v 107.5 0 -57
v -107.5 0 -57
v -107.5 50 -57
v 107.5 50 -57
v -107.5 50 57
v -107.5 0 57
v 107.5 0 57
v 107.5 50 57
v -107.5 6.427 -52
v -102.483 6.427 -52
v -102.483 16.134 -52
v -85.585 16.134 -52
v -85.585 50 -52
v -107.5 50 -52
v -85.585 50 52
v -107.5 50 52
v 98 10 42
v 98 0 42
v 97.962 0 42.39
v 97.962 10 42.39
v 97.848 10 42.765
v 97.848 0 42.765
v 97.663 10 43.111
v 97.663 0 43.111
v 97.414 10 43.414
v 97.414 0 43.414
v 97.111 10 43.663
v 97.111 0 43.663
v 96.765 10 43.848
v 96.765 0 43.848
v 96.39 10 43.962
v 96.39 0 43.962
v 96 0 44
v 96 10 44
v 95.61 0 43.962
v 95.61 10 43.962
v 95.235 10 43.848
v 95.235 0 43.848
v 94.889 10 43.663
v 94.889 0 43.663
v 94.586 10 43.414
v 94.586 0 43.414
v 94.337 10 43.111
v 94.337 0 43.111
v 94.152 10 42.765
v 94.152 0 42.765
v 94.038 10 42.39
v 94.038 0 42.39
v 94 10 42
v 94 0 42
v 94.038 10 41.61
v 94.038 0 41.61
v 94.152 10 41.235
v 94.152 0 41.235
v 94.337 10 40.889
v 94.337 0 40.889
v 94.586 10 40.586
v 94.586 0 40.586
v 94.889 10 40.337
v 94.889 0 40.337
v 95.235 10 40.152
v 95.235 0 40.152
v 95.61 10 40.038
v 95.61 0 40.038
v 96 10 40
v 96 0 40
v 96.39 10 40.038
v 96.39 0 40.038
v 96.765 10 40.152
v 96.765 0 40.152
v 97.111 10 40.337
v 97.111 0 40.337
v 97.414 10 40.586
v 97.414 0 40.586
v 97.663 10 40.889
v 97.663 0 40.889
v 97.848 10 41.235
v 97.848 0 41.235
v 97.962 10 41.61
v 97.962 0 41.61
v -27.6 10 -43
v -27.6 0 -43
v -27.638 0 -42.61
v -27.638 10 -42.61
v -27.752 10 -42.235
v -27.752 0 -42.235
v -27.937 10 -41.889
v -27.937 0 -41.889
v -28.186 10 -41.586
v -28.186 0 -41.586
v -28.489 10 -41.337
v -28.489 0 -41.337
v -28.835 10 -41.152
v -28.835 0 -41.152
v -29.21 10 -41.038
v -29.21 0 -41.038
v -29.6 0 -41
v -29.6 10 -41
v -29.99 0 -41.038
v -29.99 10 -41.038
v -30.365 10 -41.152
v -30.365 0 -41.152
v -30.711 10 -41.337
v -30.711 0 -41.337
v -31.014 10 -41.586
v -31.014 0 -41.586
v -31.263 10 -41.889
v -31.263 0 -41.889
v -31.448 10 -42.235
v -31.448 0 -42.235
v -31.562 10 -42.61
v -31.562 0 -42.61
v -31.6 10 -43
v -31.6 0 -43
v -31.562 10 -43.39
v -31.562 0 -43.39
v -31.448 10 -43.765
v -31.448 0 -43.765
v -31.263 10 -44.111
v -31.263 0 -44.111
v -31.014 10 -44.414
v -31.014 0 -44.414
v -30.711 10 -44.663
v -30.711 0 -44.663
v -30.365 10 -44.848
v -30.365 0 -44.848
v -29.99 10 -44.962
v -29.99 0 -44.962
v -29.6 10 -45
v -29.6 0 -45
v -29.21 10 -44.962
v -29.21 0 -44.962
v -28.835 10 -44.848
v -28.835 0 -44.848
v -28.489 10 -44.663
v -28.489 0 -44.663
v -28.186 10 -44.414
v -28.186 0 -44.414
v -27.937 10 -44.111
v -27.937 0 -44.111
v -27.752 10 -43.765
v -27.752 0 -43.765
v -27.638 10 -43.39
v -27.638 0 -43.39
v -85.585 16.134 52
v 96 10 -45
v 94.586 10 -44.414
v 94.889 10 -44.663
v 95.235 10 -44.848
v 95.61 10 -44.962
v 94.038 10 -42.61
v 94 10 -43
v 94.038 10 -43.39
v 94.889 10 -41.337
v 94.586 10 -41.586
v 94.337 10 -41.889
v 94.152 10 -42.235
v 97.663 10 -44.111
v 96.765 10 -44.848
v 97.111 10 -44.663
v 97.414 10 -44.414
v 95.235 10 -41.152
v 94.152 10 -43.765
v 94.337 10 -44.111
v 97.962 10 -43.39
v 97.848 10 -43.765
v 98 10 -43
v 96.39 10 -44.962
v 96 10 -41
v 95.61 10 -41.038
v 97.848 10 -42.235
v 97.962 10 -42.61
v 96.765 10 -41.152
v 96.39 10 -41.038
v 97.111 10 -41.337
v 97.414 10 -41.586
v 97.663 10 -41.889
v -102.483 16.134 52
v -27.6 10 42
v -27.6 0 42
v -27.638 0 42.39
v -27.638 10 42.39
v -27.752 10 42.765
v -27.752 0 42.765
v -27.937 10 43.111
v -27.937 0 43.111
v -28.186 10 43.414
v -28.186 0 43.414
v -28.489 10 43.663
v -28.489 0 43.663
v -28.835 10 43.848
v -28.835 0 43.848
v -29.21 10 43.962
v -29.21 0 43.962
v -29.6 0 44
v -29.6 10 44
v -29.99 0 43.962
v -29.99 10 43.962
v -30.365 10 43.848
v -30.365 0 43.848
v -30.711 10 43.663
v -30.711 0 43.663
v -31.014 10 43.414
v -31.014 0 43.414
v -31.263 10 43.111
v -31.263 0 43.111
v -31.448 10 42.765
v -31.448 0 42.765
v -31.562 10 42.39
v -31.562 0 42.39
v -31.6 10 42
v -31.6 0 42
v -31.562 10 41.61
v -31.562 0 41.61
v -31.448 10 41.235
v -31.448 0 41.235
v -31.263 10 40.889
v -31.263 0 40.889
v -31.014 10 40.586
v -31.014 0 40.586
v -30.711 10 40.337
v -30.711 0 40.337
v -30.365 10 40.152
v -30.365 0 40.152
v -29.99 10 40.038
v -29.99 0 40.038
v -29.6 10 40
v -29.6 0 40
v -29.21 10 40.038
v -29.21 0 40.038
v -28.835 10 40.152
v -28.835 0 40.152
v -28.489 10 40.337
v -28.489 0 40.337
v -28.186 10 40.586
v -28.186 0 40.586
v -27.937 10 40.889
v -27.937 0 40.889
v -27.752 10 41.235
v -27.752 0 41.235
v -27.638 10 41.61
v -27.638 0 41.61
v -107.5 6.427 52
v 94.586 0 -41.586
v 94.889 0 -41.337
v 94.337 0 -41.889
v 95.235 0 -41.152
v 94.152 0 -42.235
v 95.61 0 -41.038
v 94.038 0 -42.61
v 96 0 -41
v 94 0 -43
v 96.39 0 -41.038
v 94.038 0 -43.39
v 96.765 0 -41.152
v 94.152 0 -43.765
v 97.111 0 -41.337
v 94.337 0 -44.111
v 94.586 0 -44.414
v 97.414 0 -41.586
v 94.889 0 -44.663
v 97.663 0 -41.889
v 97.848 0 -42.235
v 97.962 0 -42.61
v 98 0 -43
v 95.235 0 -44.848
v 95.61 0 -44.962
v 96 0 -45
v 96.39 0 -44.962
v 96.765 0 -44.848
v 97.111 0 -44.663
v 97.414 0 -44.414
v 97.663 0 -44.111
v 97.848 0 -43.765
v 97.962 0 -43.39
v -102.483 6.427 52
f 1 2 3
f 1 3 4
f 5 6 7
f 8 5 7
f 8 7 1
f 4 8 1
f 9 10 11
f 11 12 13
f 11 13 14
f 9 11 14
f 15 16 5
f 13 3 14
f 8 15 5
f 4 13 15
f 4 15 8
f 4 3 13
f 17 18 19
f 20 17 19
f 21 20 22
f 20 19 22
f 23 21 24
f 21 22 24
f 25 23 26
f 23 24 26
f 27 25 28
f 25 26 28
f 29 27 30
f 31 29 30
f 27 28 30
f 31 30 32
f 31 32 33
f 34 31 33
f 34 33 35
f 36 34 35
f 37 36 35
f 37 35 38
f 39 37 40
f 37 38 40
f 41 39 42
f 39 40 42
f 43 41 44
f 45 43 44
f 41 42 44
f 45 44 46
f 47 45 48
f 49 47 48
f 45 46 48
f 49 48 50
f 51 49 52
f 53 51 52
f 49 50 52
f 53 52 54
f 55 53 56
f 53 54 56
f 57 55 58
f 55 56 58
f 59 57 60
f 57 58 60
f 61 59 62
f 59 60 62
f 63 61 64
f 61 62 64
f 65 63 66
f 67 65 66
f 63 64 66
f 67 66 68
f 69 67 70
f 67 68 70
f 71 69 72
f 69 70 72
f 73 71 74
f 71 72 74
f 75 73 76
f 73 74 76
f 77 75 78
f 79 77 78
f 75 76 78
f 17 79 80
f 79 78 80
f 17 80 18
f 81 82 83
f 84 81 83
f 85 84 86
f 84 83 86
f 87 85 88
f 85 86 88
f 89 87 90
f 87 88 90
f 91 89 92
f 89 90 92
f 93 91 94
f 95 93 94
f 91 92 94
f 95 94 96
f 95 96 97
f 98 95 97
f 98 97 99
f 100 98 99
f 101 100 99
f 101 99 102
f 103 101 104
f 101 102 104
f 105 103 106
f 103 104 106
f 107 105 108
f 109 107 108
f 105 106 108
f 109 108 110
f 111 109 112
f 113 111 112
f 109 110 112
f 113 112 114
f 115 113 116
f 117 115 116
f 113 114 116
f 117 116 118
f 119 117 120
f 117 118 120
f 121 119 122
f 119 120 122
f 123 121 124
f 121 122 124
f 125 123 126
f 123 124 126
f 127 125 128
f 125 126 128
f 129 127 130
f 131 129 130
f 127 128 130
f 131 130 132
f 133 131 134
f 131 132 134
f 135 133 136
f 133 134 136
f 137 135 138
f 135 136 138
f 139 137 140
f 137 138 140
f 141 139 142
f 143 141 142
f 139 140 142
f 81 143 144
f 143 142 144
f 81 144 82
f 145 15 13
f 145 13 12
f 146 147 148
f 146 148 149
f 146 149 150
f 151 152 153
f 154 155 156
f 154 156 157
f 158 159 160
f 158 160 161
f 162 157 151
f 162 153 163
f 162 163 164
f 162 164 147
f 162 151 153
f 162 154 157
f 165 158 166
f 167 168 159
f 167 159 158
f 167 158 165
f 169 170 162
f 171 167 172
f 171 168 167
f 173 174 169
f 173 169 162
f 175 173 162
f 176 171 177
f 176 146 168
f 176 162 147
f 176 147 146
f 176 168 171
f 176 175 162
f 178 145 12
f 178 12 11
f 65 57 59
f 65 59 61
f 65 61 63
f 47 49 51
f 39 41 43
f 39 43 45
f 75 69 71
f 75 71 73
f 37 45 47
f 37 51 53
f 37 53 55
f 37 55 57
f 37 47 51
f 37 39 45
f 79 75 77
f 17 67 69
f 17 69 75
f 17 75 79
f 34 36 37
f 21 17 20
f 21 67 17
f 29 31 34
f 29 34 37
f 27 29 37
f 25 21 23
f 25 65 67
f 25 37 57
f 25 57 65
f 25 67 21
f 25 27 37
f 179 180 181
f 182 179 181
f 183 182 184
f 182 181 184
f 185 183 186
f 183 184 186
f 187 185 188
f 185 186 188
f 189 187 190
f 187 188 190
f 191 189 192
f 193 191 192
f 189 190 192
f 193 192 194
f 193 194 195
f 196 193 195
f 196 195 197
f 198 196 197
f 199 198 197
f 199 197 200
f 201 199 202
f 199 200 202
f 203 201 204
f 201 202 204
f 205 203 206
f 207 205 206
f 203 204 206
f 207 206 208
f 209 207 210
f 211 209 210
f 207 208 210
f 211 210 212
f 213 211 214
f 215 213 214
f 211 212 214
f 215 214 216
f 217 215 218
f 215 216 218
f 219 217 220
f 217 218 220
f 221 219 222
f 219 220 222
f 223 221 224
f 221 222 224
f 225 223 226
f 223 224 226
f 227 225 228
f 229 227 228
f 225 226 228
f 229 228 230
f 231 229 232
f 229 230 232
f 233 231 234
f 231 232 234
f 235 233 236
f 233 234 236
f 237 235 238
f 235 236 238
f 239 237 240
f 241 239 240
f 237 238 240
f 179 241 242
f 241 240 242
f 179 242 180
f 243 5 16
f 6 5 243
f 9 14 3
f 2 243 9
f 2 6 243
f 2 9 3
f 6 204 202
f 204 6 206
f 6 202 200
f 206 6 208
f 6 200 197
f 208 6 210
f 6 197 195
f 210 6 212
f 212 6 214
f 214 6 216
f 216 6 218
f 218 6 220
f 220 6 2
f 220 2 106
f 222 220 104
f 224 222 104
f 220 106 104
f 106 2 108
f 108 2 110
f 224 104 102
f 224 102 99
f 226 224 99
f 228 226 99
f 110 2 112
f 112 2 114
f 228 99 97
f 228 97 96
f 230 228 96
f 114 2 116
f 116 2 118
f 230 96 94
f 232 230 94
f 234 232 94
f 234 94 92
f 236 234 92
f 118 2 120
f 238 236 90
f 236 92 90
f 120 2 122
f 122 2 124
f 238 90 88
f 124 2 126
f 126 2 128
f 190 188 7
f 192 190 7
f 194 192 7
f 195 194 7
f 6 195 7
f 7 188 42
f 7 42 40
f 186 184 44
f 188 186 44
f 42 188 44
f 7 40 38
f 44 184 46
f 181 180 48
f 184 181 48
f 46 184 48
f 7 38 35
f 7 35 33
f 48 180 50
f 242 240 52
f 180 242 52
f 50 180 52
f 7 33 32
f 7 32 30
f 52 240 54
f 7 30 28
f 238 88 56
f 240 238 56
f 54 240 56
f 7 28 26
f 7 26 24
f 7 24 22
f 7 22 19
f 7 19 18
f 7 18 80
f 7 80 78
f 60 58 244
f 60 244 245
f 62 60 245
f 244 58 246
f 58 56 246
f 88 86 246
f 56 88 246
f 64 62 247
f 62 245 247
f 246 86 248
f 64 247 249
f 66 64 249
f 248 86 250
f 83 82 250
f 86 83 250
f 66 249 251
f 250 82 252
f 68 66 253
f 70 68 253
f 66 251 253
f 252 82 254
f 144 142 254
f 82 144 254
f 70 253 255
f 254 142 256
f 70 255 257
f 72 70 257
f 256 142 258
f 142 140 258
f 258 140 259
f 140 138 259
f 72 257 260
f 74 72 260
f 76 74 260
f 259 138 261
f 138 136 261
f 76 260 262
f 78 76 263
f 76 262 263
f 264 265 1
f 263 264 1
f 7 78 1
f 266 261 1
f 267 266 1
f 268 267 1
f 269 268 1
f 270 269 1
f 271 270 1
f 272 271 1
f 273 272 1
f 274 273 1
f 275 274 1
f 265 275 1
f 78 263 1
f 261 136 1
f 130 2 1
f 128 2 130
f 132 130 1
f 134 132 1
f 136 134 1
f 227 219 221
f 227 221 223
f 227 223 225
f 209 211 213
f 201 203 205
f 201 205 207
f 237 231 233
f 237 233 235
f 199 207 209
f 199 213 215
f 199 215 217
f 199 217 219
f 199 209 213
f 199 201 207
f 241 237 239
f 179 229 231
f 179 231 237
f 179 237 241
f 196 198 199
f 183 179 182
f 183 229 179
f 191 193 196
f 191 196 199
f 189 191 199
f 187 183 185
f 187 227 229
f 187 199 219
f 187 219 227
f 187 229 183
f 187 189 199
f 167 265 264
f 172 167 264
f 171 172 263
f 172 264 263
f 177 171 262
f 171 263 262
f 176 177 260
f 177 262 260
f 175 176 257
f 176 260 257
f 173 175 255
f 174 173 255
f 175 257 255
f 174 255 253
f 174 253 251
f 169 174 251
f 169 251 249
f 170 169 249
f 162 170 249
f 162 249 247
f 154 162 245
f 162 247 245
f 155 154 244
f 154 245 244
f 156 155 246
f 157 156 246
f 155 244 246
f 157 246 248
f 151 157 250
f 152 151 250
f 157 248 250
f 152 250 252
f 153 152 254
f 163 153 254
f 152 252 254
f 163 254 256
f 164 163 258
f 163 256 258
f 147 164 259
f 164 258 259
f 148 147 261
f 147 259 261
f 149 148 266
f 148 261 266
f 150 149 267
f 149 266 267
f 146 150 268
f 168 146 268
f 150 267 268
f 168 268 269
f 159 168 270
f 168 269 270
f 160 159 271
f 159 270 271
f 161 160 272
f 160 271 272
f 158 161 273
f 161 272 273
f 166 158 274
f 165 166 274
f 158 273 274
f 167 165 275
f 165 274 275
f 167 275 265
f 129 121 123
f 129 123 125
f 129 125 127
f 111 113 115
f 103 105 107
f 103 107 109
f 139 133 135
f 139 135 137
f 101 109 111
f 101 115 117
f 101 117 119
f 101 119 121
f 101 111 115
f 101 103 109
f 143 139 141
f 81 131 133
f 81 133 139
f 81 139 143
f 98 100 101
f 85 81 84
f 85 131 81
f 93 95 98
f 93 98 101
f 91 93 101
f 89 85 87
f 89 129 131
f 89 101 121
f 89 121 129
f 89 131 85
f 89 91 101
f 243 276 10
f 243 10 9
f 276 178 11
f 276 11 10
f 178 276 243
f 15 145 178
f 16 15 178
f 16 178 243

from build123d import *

# Parameters (mm, degrees)
ESBO_O1_W                = 215
ESBO_O1_H                = 114
RESSALTO_EXTRUS_O1_DEPTH = 50
CORTE_EXTRUS_O1_START    = -5
CORTE_EXTRUS_O1_DEPTH    = 104
ESBO_O4_R                = 2
CORTE_EXTRUS_O2_DEPTH    = 10


with BuildPart() as part:
    # Esboço1 → Ressalto-extrusão1 (new body)
    with BuildSketch(Plane(origin=(0, 0, 0), x_dir=(1, 0, 0), z_dir=(0, 1, 0))):
        Rectangle(ESBO_O1_W, ESBO_O1_H)
    extrude(amount=RESSALTO_EXTRUS_O1_DEPTH)

    # Esboço3 → Corte-extrusão1 (cut)
    with BuildSketch(Plane.XY.offset(57).offset(CORTE_EXTRUS_O1_START)):
        Polygon((-107.5, 50), (-85.58523496, 50), (-85.58523496, 16.13389081), (-102.483117777, 16.13389081), (-102.483117777, 6.426889092), (-107.5, 6.426889092), (-107.5, 17.457061978), align=None)
    extrude(amount=-CORTE_EXTRUS_O1_DEPTH, mode=Mode.SUBTRACT)

    # Esboço4 → Corte-extrusão2 (cut)
    with BuildSketch(Plane.XZ):
        with Locations((96, 42)):
            Circle(ESBO_O4_R)
        with Locations((-29.6, 42)):
            Circle(ESBO_O4_R)
        with Locations((-29.6, -43)):
            Circle(ESBO_O4_R)
        with Locations((96, -43)):
            Circle(ESBO_O4_R)
    extrude(amount=-CORTE_EXTRUS_O2_DEPTH, mode=Mode.SUBTRACT)


solid = part.part
